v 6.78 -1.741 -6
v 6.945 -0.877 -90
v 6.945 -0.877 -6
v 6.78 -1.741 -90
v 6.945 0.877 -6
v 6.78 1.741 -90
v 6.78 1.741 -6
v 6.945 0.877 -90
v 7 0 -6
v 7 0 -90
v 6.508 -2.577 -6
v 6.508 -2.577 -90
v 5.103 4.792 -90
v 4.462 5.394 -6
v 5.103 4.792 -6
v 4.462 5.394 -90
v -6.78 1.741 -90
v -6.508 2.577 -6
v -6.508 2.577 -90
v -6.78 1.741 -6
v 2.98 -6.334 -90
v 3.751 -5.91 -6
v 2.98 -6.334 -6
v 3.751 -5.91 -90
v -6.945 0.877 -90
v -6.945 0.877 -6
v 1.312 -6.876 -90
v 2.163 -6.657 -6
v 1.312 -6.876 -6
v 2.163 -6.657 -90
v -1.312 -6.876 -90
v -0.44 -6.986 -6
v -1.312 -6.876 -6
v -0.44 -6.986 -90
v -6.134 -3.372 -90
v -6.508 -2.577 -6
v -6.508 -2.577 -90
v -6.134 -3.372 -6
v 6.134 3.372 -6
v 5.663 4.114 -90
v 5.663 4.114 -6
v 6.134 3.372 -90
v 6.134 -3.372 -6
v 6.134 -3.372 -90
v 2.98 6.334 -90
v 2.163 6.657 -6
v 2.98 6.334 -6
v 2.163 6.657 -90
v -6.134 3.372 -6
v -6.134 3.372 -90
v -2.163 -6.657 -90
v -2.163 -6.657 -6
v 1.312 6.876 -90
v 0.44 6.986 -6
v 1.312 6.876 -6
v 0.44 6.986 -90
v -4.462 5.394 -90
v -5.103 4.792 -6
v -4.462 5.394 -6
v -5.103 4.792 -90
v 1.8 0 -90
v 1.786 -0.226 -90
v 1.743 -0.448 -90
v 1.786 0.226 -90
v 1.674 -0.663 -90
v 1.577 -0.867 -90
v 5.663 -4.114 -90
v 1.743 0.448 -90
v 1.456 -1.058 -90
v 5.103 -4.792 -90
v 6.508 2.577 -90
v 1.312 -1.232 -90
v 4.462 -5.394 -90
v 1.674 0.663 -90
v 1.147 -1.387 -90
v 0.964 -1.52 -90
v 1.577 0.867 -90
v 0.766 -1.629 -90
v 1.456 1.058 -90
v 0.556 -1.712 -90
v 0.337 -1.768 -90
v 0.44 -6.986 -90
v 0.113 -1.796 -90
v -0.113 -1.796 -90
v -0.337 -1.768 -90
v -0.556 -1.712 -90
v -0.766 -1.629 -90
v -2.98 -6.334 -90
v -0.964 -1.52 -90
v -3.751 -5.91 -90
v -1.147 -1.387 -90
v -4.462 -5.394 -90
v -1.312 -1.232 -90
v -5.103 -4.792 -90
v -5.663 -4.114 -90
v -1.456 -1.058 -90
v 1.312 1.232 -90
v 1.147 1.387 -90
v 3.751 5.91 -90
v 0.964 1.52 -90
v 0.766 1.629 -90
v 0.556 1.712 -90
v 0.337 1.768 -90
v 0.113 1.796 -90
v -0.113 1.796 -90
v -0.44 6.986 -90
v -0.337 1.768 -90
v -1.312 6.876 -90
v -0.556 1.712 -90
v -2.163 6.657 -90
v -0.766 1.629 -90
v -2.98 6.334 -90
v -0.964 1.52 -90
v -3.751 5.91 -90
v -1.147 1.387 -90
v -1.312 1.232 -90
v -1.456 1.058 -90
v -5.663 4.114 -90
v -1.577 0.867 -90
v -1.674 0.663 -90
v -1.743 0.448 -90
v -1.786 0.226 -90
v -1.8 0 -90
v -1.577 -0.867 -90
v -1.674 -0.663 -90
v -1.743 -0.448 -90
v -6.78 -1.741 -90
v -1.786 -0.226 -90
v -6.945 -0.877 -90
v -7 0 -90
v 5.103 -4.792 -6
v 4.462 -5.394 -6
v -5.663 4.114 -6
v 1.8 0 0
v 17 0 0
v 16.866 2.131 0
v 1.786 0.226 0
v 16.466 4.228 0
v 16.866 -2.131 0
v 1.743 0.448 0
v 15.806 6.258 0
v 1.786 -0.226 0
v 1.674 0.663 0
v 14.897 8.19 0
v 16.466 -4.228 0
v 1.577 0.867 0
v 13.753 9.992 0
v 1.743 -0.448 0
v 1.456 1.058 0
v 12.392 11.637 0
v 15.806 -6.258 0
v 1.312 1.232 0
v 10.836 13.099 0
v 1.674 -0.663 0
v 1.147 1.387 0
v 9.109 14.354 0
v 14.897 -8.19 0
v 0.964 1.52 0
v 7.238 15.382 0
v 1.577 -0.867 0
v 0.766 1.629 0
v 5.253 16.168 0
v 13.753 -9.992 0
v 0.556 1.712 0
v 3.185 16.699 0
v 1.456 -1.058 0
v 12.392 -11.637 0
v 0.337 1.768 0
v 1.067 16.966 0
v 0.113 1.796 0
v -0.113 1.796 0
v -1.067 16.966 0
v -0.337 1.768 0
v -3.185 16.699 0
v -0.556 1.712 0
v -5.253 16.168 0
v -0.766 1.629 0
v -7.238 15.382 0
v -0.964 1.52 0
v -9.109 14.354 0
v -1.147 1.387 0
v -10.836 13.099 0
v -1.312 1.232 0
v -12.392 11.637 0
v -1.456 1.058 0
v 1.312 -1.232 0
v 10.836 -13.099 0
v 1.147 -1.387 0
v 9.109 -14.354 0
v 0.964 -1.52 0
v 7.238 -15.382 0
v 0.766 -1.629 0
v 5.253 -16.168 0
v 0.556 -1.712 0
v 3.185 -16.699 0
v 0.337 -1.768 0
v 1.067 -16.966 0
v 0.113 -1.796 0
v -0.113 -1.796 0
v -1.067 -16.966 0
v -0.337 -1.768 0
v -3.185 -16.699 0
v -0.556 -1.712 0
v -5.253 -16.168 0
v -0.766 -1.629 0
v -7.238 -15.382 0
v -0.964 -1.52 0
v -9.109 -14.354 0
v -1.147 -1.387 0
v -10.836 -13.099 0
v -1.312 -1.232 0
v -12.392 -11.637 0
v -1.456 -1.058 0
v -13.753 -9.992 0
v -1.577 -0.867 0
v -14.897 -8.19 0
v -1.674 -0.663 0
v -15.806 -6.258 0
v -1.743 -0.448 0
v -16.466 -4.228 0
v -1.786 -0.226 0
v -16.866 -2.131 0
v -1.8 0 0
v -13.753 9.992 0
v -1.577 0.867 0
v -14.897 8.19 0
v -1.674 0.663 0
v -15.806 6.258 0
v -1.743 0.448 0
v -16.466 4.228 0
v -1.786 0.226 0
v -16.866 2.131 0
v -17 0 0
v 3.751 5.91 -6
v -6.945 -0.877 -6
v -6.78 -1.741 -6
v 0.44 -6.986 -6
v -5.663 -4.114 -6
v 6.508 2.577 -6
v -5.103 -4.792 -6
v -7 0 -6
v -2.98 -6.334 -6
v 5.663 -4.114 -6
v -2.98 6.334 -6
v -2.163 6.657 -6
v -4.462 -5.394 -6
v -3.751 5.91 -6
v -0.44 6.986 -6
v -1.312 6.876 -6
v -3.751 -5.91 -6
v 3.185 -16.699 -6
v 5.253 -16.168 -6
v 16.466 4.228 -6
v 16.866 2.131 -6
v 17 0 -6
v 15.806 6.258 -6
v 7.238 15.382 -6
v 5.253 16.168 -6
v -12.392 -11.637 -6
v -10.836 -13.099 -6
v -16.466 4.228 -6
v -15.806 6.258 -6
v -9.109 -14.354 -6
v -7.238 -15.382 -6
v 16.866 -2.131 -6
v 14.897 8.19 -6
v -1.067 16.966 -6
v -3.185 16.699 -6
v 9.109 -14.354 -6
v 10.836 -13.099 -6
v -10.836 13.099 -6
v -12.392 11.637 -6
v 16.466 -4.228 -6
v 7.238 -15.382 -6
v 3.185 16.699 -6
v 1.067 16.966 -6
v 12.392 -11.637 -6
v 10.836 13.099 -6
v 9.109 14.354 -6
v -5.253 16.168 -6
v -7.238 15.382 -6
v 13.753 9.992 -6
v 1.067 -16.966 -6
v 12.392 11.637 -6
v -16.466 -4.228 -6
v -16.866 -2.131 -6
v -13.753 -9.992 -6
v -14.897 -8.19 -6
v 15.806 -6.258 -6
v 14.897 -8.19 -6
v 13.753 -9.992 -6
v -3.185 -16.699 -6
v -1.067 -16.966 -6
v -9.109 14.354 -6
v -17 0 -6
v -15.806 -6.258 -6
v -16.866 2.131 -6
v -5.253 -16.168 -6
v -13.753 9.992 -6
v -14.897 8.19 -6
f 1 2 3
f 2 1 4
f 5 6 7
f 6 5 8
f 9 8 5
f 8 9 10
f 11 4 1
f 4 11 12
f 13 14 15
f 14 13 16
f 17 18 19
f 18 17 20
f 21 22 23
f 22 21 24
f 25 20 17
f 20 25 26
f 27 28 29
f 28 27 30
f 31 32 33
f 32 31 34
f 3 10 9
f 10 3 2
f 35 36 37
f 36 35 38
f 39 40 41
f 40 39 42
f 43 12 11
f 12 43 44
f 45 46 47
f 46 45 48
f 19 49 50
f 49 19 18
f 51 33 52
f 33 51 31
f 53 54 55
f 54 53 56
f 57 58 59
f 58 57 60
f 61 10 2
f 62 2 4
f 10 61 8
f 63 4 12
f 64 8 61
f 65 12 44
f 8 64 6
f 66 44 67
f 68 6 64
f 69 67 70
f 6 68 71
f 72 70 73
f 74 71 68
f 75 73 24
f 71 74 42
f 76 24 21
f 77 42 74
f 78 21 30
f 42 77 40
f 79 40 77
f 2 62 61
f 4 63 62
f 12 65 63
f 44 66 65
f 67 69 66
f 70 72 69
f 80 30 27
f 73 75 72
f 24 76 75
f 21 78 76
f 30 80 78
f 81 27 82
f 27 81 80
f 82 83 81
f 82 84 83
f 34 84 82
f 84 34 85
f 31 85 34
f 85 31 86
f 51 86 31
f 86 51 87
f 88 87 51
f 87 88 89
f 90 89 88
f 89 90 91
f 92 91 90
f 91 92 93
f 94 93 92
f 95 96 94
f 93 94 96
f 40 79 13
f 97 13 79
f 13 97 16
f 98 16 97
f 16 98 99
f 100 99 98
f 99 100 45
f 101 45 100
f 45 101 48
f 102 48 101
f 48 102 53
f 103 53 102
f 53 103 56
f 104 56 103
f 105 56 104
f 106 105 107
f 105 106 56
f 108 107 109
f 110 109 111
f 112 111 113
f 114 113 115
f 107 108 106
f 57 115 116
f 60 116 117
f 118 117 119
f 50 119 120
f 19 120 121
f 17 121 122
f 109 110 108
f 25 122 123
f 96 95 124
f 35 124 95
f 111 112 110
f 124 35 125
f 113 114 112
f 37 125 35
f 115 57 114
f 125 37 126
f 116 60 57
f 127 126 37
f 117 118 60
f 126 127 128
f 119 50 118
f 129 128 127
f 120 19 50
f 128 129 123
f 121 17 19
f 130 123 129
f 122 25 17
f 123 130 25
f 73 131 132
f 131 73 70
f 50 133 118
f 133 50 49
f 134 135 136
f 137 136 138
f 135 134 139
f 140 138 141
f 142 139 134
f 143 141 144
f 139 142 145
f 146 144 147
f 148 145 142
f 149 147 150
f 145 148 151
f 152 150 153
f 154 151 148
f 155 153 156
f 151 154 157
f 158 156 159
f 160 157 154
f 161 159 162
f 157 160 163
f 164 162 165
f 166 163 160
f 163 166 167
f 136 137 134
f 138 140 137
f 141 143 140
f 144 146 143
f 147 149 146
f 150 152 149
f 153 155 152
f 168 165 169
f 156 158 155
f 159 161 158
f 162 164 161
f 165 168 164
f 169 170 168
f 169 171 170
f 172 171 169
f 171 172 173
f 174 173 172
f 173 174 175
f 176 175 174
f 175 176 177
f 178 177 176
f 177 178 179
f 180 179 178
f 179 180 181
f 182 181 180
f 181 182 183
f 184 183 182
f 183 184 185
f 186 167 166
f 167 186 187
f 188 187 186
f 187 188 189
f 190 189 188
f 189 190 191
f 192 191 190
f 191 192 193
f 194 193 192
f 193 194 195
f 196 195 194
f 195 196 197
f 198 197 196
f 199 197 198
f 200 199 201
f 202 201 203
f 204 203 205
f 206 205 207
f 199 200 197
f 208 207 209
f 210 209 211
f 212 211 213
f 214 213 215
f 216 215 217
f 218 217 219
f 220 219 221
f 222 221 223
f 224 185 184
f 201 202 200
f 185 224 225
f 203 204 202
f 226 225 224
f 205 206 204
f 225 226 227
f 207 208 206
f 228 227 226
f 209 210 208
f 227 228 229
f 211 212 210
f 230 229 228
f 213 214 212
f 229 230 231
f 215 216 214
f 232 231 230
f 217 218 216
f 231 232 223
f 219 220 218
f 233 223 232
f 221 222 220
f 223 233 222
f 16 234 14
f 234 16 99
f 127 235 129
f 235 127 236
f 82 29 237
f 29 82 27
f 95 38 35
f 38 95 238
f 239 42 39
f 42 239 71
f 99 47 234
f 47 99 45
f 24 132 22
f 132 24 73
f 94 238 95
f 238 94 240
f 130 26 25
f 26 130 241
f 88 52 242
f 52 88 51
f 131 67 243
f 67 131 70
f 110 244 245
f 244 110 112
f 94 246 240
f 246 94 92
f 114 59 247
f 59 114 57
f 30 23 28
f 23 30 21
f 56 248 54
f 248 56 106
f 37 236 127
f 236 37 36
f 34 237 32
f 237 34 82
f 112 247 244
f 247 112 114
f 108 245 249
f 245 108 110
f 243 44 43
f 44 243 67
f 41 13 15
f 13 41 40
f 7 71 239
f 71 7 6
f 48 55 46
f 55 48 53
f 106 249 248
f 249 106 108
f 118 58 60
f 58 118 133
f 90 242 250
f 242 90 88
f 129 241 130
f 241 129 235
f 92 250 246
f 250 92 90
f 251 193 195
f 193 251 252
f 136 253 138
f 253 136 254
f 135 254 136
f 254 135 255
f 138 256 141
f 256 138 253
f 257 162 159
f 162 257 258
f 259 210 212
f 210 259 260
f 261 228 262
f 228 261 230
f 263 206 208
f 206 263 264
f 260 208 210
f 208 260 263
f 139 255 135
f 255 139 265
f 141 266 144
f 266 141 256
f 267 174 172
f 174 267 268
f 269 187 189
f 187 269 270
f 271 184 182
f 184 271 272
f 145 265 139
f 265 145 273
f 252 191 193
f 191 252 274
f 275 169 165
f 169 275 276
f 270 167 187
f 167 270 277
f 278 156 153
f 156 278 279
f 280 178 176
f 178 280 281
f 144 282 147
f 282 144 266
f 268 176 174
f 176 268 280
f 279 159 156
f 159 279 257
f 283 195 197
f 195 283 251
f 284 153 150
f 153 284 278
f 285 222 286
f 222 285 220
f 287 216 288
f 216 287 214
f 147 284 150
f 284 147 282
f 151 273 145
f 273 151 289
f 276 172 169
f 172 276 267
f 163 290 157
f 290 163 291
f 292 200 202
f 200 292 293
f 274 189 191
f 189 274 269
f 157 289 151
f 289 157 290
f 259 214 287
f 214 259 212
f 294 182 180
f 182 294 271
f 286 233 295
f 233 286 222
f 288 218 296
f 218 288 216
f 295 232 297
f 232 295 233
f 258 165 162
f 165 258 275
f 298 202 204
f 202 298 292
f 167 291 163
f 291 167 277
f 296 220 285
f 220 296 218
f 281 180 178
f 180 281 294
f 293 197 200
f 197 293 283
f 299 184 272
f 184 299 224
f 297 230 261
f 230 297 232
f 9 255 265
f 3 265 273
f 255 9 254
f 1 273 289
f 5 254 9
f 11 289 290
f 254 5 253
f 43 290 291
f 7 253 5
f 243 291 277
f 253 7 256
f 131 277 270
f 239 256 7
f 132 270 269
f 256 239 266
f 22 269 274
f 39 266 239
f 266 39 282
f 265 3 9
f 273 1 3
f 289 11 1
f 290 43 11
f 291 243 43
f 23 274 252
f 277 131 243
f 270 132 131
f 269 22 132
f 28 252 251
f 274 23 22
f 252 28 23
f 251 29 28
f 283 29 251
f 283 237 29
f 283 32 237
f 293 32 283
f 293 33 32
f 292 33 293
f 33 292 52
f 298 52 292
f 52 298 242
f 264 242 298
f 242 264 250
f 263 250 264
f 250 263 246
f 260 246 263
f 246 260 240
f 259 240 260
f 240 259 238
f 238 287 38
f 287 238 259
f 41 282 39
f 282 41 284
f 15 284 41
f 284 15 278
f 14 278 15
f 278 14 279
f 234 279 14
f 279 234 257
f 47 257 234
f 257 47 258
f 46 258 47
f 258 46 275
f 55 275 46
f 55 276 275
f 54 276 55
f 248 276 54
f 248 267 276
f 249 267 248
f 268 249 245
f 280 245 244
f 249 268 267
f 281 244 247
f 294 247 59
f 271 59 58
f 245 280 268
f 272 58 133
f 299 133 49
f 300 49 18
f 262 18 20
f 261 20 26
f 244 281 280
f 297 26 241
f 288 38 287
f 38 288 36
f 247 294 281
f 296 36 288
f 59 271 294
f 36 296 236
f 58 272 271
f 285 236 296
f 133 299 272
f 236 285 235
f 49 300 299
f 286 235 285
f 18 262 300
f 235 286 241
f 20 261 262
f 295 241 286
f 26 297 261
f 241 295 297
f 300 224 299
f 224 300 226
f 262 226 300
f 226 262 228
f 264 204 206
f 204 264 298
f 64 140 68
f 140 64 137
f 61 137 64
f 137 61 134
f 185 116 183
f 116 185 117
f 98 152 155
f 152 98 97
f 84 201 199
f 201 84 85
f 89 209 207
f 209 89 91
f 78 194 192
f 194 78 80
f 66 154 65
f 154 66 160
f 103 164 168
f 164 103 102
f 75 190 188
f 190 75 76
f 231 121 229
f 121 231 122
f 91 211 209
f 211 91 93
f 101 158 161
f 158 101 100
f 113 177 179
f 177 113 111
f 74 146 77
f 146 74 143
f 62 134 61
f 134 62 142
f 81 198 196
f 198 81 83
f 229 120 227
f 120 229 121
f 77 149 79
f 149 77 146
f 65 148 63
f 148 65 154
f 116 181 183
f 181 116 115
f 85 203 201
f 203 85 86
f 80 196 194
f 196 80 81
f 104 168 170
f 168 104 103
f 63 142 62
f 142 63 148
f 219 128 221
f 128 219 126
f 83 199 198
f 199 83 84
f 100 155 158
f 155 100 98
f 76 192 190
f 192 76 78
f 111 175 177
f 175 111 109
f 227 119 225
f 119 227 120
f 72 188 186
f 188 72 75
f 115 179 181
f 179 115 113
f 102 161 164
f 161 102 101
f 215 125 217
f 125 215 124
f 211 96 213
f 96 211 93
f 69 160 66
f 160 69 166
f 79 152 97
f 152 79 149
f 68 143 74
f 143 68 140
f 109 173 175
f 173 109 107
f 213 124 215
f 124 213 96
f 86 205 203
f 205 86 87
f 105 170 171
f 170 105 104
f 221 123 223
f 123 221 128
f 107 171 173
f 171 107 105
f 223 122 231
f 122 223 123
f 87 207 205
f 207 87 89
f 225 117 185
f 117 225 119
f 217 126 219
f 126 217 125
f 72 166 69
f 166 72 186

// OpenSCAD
$fn = 50;


difference() {
	union() {
		translate(v = [0, 0, -90.0000000000]) {
			cylinder(h = 90, r = 7.0000000000);
		}
		translate(v = [0, 0, -6.0000000000]) {
			cylinder(h = 6, r = 17.0000000000);
		}
	}
	union() {
		#translate(v = [0, 0, -90]) {
			cylinder(h = 90, r = 1.8000000000);
		}
	}
}
